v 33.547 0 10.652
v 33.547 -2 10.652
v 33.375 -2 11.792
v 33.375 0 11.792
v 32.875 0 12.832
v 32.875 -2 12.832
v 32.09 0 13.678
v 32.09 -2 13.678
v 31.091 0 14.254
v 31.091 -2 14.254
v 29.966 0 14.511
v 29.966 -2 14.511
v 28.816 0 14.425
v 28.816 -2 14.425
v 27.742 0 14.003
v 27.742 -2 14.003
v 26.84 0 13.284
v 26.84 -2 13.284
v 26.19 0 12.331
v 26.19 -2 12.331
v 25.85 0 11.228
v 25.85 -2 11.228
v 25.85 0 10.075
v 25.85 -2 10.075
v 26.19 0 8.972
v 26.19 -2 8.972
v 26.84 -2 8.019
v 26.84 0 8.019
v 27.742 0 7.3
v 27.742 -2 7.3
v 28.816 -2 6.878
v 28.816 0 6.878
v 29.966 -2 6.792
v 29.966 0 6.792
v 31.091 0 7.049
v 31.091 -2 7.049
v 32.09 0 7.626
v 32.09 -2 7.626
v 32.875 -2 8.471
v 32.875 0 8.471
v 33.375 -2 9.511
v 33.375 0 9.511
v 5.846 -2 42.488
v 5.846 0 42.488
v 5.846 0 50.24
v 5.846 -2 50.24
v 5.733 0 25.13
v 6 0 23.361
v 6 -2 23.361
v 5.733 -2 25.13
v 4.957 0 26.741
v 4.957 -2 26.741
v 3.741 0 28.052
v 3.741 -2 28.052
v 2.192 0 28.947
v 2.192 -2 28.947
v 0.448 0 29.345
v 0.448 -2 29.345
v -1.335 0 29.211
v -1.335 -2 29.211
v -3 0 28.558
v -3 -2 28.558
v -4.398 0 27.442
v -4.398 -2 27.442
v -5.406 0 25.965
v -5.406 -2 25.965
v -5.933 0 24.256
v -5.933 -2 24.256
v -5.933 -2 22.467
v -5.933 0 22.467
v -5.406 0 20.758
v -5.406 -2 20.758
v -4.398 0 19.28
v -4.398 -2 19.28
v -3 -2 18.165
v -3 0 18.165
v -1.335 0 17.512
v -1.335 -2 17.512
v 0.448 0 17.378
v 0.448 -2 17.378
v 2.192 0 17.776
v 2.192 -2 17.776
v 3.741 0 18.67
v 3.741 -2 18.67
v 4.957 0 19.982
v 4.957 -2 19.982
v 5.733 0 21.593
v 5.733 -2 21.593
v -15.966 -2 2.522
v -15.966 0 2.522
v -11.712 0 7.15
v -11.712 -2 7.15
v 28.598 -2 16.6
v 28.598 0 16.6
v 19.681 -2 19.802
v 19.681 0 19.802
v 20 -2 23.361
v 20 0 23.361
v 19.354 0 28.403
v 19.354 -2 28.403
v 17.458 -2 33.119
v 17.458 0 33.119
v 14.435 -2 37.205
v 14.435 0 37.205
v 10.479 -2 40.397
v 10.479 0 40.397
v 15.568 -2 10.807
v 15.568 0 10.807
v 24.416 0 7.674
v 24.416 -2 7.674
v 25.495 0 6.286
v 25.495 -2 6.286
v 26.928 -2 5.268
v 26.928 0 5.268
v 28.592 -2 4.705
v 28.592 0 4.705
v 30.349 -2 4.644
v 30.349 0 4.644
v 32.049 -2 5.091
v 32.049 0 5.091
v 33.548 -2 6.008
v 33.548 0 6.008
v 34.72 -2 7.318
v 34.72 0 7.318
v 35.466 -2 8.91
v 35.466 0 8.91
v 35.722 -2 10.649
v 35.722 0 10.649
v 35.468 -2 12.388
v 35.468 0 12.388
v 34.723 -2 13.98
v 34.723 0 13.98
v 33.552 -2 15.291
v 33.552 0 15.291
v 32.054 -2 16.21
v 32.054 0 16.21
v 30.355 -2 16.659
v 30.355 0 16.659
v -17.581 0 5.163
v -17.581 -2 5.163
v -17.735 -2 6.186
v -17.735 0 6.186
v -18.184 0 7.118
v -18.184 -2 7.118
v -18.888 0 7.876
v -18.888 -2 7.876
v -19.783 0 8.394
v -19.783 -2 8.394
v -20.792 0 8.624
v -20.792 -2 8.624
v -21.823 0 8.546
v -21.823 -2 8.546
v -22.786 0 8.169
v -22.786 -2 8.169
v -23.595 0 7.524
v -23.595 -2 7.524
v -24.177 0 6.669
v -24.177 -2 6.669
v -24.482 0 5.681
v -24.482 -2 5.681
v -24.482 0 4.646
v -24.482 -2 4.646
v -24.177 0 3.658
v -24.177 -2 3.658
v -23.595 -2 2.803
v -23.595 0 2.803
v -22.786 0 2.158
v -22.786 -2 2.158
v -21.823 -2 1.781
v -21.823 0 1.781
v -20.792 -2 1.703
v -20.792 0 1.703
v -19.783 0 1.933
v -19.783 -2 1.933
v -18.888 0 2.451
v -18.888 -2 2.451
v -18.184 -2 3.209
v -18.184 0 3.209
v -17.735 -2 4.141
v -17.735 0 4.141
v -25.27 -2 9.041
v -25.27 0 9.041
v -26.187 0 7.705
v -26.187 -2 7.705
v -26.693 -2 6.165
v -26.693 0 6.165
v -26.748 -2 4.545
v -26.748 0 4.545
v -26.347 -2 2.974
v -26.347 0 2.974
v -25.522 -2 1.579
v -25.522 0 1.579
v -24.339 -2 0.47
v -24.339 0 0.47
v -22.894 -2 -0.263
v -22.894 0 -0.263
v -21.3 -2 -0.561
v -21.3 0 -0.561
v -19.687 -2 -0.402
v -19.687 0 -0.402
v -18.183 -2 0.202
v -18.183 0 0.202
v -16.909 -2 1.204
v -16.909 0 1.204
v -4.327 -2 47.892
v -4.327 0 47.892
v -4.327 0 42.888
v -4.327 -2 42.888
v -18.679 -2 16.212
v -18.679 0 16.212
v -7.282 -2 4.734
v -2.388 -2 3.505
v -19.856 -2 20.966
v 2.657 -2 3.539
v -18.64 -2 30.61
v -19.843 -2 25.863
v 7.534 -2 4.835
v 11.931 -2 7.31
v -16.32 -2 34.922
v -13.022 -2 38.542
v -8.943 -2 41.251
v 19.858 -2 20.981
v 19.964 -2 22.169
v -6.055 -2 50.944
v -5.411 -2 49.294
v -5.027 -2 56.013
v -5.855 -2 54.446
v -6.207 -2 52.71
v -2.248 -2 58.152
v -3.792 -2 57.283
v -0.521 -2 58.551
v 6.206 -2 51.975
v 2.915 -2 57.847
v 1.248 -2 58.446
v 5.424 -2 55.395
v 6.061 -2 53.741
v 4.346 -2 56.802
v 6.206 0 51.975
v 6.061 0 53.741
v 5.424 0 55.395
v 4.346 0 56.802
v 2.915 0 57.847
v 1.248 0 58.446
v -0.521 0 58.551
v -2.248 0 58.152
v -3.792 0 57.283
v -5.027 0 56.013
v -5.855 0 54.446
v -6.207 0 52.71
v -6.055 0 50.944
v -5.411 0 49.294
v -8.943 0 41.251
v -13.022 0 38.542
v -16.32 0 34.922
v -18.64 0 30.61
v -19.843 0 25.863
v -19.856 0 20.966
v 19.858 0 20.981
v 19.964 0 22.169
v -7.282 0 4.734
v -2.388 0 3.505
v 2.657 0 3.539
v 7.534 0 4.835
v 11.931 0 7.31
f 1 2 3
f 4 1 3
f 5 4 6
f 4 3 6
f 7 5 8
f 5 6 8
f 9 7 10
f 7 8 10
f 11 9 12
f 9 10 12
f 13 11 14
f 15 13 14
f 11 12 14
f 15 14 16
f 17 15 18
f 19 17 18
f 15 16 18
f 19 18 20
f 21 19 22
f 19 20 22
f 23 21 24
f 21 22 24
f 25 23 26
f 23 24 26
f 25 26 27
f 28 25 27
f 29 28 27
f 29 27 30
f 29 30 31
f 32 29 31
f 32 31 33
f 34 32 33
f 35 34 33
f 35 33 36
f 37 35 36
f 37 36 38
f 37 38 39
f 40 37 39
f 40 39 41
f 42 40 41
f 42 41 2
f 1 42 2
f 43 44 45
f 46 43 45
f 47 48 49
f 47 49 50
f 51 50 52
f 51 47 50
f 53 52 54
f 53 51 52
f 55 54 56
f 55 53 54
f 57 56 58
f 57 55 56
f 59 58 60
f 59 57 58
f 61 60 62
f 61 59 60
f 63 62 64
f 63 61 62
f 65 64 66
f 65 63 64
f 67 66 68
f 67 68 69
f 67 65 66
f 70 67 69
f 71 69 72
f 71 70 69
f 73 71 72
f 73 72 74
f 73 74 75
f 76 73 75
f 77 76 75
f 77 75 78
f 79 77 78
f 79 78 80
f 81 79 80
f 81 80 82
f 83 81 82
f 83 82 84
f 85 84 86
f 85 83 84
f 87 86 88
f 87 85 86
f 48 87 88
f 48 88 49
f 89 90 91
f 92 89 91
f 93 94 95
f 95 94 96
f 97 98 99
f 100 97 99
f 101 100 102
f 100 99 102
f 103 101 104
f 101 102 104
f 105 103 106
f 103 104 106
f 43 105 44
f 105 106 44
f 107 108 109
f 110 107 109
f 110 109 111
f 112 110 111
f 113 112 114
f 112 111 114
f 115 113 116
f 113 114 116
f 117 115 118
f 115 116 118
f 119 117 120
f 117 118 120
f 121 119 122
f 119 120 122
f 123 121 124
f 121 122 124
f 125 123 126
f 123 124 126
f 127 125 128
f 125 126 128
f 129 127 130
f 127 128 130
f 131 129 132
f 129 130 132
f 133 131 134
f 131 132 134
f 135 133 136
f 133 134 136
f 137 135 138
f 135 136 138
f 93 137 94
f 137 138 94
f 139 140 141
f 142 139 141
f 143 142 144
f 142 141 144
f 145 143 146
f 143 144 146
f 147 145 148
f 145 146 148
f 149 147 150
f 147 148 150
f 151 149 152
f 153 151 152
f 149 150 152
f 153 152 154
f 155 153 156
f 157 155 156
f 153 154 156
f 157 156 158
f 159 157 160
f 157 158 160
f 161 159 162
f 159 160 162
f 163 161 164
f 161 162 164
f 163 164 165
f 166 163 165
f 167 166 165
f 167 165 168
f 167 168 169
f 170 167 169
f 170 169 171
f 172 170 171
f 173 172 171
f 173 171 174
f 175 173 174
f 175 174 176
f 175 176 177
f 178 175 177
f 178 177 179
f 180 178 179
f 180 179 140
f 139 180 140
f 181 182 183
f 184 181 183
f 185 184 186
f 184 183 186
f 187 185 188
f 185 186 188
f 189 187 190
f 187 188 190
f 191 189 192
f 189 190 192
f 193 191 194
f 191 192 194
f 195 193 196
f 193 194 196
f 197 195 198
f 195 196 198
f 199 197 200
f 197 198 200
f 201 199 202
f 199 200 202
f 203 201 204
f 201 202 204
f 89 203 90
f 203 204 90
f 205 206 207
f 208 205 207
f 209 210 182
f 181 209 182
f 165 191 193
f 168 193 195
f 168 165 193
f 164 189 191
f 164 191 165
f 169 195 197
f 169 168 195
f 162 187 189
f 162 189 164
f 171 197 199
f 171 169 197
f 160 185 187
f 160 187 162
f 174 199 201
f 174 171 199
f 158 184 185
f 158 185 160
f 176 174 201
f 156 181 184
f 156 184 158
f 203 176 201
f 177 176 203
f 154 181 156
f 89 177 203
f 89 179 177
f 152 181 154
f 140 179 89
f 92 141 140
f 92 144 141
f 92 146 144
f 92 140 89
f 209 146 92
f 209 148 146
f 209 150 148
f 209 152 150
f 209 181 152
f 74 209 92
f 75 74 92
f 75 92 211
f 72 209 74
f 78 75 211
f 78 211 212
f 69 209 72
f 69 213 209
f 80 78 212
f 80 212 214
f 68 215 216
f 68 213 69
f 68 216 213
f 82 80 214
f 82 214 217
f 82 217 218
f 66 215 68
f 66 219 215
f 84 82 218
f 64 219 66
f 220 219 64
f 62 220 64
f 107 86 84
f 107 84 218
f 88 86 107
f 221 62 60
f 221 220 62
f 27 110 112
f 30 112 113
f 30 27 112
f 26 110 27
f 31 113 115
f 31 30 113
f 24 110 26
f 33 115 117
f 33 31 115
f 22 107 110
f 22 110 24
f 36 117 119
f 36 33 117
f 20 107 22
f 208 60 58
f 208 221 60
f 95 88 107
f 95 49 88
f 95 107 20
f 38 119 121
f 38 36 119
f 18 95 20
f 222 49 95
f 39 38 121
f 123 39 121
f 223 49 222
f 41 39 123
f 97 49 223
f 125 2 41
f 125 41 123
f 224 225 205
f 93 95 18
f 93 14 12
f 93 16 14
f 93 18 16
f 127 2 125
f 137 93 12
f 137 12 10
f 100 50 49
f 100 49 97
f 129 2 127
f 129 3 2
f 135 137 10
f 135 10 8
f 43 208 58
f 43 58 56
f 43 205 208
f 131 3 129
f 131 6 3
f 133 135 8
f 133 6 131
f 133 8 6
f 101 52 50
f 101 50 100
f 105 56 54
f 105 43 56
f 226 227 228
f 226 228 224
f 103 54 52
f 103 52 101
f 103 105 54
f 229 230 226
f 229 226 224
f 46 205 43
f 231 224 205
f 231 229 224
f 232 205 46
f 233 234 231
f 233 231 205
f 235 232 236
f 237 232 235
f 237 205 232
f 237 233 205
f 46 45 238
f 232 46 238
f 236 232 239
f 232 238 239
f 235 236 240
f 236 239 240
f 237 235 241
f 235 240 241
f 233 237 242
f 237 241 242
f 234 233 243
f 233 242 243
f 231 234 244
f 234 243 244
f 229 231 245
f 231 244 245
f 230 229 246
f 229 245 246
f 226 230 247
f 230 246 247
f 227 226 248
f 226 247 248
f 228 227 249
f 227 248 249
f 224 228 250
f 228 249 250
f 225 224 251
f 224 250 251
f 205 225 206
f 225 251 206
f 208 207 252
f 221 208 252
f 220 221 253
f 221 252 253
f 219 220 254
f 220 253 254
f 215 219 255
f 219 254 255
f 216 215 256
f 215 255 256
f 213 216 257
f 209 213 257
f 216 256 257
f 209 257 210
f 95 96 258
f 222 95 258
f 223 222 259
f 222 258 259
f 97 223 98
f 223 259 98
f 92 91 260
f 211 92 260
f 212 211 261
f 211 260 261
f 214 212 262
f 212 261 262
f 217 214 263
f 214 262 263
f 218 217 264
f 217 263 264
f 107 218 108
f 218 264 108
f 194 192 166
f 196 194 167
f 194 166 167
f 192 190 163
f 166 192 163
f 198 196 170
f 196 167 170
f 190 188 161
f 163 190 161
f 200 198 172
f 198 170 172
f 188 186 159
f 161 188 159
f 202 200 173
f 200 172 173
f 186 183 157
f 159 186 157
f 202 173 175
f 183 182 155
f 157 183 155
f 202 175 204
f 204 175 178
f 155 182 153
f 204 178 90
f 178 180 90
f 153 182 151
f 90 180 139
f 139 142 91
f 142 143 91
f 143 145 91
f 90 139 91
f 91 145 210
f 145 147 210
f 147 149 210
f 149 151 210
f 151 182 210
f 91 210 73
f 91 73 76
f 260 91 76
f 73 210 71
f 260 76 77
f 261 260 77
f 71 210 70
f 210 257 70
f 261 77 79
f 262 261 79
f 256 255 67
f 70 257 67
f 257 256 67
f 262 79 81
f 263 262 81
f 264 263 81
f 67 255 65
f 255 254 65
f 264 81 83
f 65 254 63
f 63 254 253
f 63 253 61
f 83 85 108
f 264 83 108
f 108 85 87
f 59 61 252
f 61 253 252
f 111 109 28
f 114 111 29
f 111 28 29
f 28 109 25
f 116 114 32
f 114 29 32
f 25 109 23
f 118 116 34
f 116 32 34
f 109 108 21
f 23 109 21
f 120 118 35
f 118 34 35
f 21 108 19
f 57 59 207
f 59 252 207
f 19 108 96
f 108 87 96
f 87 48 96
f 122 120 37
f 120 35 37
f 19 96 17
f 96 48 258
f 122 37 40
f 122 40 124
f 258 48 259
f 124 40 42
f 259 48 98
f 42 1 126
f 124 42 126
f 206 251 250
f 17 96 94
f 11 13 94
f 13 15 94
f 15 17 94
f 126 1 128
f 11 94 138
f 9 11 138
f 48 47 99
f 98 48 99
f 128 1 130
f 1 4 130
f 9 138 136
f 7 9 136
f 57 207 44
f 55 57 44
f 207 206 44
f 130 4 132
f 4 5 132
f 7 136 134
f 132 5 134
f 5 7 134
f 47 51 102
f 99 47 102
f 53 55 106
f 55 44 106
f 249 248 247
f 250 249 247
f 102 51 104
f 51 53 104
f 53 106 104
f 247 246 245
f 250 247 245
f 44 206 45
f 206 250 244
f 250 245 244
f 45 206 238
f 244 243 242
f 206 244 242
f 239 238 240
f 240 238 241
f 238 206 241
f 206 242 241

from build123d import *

# Parameters (mm, degrees)
F0_R     = 6
F3_DEPTH = 2
F4_R     = 2.937220037
F4_R_2   = 2.9600798579
F4_R_3   = 3.1369542822
F5_DEPTH = 25
F6_R     = 3.870285665
F6_R_2   = 3.4699614842
F7_DEPTH = 3


# Not quite as in the source:
# - the program builds the solid bodies; features that only make, move or delete a surface that nothing else refers to are left out


with BuildPart() as f3:
    # F0 (on Front) → F3 (new body)
    with BuildSketch(Plane.XZ):
        with BuildLine():
            ThreePointArc((19.6806687258, 19.8017779916), (19.9200072103, 21.5744676649), (20, 23.3614519238))
            ThreePointArc((20, 23.3614519238), (16.0767393697, 35.2584452936), (5.8461548761, 42.4879380926))
            ThreePointArc((5.8461548761, 42.4879380926), (0.7853649586, 43.3460260219), (-4.327156771, 42.8877345777))
            ThreePointArc((-4.327156771, 42.8877345777), (-17.6128349493, 32.8371073128), (-18.6785365647, 16.2121672183))
            ThreePointArc((-18.6785365647, 16.2121672183), (-15.8565738824, 11.1725608869), (-11.7121291204, 7.1495417506))
            ThreePointArc((-11.7121291204, 7.1495417506), (2.6572751847, 3.5387657135), (15.5683835849, 10.8065551679))
            ThreePointArc((15.5683835849, 10.8065551679), (18.189349373, 15.0459501719), (19.6806687258, 19.8017779916))
        make_face()
        with Locations((0, 23.3614519238)):
            Circle(F0_R, mode=Mode.SUBTRACT)
        with BuildLine():
            ThreePointArc((-4.327156771, 42.8877345777), (0.7853649586, 43.3460260219), (5.8461548761, 42.4879380926))
            Line((5.8461548761, 42.4879380926), (5.8461548761, 50.2402076719))
            ThreePointArc((5.8461548761, 50.2402076719), (-1.3985114704, 58.4135951865), (-4.327156771, 47.891594871))
            Line((-4.327156771, 47.891594871), (-4.327156771, 42.8877345777))
        make_face()
        with BuildLine():
            Line((28.5979291758, 16.5996841985), (19.6806687258, 19.8017779916))
            ThreePointArc((19.6806687258, 19.8017779916), (18.189349373, 15.0459501719), (15.5683835849, 10.8065551679))
            Line((15.5683835849, 10.8065551679), (24.4160998295, 7.6740266873))
            ThreePointArc((24.4160998295, 7.6740266873), (35.1512386763, 8.0868826224), (28.5979291758, 16.5996841985))
        make_face()
        with BuildLine():
            ThreePointArc((-11.7121291204, 7.1495417506), (-15.8565738824, 11.1725608869), (-18.6785365647, 16.2121672183))
            Line((-18.6785365647, 16.2121672183), (-25.2698698947, 9.0414457989))
            ThreePointArc((-25.2698698947, 9.0414457989), (-24.3393468403, 0.4704595262), (-15.965672237, 2.5221058119))
            Line((-15.965672237, 2.5221058119), (-11.7121291204, 7.1495417506))
        make_face()
    extrude(amount=F3_DEPTH)

    # F4 (on Front) → F5 (cut)
    with BuildSketch(Plane.XZ):
        with Locations((0, 53.6376424134)):
            Circle(F4_R)
        with Locations((29.5011680573, 10.3136152029)):
            Circle(F4_R_2)
        with Locations((-20.7987613976, 4.8063262366)):
            Circle(F4_R_3)
    extrude(amount=-F5_DEPTH, mode=Mode.SUBTRACT)

    # F6 (on face) → F7 (cut)
    with BuildSketch(Plane.XZ.offset(2)):
        with Locations((29.6770948917, 10.6516163796)):
            Circle(F6_R)
        with Locations((-21.0510119796, 5.1634679548)):
            Circle(F6_R_2)
    extrude(amount=-F7_DEPTH, mode=Mode.SUBTRACT)


solid = f3.part
